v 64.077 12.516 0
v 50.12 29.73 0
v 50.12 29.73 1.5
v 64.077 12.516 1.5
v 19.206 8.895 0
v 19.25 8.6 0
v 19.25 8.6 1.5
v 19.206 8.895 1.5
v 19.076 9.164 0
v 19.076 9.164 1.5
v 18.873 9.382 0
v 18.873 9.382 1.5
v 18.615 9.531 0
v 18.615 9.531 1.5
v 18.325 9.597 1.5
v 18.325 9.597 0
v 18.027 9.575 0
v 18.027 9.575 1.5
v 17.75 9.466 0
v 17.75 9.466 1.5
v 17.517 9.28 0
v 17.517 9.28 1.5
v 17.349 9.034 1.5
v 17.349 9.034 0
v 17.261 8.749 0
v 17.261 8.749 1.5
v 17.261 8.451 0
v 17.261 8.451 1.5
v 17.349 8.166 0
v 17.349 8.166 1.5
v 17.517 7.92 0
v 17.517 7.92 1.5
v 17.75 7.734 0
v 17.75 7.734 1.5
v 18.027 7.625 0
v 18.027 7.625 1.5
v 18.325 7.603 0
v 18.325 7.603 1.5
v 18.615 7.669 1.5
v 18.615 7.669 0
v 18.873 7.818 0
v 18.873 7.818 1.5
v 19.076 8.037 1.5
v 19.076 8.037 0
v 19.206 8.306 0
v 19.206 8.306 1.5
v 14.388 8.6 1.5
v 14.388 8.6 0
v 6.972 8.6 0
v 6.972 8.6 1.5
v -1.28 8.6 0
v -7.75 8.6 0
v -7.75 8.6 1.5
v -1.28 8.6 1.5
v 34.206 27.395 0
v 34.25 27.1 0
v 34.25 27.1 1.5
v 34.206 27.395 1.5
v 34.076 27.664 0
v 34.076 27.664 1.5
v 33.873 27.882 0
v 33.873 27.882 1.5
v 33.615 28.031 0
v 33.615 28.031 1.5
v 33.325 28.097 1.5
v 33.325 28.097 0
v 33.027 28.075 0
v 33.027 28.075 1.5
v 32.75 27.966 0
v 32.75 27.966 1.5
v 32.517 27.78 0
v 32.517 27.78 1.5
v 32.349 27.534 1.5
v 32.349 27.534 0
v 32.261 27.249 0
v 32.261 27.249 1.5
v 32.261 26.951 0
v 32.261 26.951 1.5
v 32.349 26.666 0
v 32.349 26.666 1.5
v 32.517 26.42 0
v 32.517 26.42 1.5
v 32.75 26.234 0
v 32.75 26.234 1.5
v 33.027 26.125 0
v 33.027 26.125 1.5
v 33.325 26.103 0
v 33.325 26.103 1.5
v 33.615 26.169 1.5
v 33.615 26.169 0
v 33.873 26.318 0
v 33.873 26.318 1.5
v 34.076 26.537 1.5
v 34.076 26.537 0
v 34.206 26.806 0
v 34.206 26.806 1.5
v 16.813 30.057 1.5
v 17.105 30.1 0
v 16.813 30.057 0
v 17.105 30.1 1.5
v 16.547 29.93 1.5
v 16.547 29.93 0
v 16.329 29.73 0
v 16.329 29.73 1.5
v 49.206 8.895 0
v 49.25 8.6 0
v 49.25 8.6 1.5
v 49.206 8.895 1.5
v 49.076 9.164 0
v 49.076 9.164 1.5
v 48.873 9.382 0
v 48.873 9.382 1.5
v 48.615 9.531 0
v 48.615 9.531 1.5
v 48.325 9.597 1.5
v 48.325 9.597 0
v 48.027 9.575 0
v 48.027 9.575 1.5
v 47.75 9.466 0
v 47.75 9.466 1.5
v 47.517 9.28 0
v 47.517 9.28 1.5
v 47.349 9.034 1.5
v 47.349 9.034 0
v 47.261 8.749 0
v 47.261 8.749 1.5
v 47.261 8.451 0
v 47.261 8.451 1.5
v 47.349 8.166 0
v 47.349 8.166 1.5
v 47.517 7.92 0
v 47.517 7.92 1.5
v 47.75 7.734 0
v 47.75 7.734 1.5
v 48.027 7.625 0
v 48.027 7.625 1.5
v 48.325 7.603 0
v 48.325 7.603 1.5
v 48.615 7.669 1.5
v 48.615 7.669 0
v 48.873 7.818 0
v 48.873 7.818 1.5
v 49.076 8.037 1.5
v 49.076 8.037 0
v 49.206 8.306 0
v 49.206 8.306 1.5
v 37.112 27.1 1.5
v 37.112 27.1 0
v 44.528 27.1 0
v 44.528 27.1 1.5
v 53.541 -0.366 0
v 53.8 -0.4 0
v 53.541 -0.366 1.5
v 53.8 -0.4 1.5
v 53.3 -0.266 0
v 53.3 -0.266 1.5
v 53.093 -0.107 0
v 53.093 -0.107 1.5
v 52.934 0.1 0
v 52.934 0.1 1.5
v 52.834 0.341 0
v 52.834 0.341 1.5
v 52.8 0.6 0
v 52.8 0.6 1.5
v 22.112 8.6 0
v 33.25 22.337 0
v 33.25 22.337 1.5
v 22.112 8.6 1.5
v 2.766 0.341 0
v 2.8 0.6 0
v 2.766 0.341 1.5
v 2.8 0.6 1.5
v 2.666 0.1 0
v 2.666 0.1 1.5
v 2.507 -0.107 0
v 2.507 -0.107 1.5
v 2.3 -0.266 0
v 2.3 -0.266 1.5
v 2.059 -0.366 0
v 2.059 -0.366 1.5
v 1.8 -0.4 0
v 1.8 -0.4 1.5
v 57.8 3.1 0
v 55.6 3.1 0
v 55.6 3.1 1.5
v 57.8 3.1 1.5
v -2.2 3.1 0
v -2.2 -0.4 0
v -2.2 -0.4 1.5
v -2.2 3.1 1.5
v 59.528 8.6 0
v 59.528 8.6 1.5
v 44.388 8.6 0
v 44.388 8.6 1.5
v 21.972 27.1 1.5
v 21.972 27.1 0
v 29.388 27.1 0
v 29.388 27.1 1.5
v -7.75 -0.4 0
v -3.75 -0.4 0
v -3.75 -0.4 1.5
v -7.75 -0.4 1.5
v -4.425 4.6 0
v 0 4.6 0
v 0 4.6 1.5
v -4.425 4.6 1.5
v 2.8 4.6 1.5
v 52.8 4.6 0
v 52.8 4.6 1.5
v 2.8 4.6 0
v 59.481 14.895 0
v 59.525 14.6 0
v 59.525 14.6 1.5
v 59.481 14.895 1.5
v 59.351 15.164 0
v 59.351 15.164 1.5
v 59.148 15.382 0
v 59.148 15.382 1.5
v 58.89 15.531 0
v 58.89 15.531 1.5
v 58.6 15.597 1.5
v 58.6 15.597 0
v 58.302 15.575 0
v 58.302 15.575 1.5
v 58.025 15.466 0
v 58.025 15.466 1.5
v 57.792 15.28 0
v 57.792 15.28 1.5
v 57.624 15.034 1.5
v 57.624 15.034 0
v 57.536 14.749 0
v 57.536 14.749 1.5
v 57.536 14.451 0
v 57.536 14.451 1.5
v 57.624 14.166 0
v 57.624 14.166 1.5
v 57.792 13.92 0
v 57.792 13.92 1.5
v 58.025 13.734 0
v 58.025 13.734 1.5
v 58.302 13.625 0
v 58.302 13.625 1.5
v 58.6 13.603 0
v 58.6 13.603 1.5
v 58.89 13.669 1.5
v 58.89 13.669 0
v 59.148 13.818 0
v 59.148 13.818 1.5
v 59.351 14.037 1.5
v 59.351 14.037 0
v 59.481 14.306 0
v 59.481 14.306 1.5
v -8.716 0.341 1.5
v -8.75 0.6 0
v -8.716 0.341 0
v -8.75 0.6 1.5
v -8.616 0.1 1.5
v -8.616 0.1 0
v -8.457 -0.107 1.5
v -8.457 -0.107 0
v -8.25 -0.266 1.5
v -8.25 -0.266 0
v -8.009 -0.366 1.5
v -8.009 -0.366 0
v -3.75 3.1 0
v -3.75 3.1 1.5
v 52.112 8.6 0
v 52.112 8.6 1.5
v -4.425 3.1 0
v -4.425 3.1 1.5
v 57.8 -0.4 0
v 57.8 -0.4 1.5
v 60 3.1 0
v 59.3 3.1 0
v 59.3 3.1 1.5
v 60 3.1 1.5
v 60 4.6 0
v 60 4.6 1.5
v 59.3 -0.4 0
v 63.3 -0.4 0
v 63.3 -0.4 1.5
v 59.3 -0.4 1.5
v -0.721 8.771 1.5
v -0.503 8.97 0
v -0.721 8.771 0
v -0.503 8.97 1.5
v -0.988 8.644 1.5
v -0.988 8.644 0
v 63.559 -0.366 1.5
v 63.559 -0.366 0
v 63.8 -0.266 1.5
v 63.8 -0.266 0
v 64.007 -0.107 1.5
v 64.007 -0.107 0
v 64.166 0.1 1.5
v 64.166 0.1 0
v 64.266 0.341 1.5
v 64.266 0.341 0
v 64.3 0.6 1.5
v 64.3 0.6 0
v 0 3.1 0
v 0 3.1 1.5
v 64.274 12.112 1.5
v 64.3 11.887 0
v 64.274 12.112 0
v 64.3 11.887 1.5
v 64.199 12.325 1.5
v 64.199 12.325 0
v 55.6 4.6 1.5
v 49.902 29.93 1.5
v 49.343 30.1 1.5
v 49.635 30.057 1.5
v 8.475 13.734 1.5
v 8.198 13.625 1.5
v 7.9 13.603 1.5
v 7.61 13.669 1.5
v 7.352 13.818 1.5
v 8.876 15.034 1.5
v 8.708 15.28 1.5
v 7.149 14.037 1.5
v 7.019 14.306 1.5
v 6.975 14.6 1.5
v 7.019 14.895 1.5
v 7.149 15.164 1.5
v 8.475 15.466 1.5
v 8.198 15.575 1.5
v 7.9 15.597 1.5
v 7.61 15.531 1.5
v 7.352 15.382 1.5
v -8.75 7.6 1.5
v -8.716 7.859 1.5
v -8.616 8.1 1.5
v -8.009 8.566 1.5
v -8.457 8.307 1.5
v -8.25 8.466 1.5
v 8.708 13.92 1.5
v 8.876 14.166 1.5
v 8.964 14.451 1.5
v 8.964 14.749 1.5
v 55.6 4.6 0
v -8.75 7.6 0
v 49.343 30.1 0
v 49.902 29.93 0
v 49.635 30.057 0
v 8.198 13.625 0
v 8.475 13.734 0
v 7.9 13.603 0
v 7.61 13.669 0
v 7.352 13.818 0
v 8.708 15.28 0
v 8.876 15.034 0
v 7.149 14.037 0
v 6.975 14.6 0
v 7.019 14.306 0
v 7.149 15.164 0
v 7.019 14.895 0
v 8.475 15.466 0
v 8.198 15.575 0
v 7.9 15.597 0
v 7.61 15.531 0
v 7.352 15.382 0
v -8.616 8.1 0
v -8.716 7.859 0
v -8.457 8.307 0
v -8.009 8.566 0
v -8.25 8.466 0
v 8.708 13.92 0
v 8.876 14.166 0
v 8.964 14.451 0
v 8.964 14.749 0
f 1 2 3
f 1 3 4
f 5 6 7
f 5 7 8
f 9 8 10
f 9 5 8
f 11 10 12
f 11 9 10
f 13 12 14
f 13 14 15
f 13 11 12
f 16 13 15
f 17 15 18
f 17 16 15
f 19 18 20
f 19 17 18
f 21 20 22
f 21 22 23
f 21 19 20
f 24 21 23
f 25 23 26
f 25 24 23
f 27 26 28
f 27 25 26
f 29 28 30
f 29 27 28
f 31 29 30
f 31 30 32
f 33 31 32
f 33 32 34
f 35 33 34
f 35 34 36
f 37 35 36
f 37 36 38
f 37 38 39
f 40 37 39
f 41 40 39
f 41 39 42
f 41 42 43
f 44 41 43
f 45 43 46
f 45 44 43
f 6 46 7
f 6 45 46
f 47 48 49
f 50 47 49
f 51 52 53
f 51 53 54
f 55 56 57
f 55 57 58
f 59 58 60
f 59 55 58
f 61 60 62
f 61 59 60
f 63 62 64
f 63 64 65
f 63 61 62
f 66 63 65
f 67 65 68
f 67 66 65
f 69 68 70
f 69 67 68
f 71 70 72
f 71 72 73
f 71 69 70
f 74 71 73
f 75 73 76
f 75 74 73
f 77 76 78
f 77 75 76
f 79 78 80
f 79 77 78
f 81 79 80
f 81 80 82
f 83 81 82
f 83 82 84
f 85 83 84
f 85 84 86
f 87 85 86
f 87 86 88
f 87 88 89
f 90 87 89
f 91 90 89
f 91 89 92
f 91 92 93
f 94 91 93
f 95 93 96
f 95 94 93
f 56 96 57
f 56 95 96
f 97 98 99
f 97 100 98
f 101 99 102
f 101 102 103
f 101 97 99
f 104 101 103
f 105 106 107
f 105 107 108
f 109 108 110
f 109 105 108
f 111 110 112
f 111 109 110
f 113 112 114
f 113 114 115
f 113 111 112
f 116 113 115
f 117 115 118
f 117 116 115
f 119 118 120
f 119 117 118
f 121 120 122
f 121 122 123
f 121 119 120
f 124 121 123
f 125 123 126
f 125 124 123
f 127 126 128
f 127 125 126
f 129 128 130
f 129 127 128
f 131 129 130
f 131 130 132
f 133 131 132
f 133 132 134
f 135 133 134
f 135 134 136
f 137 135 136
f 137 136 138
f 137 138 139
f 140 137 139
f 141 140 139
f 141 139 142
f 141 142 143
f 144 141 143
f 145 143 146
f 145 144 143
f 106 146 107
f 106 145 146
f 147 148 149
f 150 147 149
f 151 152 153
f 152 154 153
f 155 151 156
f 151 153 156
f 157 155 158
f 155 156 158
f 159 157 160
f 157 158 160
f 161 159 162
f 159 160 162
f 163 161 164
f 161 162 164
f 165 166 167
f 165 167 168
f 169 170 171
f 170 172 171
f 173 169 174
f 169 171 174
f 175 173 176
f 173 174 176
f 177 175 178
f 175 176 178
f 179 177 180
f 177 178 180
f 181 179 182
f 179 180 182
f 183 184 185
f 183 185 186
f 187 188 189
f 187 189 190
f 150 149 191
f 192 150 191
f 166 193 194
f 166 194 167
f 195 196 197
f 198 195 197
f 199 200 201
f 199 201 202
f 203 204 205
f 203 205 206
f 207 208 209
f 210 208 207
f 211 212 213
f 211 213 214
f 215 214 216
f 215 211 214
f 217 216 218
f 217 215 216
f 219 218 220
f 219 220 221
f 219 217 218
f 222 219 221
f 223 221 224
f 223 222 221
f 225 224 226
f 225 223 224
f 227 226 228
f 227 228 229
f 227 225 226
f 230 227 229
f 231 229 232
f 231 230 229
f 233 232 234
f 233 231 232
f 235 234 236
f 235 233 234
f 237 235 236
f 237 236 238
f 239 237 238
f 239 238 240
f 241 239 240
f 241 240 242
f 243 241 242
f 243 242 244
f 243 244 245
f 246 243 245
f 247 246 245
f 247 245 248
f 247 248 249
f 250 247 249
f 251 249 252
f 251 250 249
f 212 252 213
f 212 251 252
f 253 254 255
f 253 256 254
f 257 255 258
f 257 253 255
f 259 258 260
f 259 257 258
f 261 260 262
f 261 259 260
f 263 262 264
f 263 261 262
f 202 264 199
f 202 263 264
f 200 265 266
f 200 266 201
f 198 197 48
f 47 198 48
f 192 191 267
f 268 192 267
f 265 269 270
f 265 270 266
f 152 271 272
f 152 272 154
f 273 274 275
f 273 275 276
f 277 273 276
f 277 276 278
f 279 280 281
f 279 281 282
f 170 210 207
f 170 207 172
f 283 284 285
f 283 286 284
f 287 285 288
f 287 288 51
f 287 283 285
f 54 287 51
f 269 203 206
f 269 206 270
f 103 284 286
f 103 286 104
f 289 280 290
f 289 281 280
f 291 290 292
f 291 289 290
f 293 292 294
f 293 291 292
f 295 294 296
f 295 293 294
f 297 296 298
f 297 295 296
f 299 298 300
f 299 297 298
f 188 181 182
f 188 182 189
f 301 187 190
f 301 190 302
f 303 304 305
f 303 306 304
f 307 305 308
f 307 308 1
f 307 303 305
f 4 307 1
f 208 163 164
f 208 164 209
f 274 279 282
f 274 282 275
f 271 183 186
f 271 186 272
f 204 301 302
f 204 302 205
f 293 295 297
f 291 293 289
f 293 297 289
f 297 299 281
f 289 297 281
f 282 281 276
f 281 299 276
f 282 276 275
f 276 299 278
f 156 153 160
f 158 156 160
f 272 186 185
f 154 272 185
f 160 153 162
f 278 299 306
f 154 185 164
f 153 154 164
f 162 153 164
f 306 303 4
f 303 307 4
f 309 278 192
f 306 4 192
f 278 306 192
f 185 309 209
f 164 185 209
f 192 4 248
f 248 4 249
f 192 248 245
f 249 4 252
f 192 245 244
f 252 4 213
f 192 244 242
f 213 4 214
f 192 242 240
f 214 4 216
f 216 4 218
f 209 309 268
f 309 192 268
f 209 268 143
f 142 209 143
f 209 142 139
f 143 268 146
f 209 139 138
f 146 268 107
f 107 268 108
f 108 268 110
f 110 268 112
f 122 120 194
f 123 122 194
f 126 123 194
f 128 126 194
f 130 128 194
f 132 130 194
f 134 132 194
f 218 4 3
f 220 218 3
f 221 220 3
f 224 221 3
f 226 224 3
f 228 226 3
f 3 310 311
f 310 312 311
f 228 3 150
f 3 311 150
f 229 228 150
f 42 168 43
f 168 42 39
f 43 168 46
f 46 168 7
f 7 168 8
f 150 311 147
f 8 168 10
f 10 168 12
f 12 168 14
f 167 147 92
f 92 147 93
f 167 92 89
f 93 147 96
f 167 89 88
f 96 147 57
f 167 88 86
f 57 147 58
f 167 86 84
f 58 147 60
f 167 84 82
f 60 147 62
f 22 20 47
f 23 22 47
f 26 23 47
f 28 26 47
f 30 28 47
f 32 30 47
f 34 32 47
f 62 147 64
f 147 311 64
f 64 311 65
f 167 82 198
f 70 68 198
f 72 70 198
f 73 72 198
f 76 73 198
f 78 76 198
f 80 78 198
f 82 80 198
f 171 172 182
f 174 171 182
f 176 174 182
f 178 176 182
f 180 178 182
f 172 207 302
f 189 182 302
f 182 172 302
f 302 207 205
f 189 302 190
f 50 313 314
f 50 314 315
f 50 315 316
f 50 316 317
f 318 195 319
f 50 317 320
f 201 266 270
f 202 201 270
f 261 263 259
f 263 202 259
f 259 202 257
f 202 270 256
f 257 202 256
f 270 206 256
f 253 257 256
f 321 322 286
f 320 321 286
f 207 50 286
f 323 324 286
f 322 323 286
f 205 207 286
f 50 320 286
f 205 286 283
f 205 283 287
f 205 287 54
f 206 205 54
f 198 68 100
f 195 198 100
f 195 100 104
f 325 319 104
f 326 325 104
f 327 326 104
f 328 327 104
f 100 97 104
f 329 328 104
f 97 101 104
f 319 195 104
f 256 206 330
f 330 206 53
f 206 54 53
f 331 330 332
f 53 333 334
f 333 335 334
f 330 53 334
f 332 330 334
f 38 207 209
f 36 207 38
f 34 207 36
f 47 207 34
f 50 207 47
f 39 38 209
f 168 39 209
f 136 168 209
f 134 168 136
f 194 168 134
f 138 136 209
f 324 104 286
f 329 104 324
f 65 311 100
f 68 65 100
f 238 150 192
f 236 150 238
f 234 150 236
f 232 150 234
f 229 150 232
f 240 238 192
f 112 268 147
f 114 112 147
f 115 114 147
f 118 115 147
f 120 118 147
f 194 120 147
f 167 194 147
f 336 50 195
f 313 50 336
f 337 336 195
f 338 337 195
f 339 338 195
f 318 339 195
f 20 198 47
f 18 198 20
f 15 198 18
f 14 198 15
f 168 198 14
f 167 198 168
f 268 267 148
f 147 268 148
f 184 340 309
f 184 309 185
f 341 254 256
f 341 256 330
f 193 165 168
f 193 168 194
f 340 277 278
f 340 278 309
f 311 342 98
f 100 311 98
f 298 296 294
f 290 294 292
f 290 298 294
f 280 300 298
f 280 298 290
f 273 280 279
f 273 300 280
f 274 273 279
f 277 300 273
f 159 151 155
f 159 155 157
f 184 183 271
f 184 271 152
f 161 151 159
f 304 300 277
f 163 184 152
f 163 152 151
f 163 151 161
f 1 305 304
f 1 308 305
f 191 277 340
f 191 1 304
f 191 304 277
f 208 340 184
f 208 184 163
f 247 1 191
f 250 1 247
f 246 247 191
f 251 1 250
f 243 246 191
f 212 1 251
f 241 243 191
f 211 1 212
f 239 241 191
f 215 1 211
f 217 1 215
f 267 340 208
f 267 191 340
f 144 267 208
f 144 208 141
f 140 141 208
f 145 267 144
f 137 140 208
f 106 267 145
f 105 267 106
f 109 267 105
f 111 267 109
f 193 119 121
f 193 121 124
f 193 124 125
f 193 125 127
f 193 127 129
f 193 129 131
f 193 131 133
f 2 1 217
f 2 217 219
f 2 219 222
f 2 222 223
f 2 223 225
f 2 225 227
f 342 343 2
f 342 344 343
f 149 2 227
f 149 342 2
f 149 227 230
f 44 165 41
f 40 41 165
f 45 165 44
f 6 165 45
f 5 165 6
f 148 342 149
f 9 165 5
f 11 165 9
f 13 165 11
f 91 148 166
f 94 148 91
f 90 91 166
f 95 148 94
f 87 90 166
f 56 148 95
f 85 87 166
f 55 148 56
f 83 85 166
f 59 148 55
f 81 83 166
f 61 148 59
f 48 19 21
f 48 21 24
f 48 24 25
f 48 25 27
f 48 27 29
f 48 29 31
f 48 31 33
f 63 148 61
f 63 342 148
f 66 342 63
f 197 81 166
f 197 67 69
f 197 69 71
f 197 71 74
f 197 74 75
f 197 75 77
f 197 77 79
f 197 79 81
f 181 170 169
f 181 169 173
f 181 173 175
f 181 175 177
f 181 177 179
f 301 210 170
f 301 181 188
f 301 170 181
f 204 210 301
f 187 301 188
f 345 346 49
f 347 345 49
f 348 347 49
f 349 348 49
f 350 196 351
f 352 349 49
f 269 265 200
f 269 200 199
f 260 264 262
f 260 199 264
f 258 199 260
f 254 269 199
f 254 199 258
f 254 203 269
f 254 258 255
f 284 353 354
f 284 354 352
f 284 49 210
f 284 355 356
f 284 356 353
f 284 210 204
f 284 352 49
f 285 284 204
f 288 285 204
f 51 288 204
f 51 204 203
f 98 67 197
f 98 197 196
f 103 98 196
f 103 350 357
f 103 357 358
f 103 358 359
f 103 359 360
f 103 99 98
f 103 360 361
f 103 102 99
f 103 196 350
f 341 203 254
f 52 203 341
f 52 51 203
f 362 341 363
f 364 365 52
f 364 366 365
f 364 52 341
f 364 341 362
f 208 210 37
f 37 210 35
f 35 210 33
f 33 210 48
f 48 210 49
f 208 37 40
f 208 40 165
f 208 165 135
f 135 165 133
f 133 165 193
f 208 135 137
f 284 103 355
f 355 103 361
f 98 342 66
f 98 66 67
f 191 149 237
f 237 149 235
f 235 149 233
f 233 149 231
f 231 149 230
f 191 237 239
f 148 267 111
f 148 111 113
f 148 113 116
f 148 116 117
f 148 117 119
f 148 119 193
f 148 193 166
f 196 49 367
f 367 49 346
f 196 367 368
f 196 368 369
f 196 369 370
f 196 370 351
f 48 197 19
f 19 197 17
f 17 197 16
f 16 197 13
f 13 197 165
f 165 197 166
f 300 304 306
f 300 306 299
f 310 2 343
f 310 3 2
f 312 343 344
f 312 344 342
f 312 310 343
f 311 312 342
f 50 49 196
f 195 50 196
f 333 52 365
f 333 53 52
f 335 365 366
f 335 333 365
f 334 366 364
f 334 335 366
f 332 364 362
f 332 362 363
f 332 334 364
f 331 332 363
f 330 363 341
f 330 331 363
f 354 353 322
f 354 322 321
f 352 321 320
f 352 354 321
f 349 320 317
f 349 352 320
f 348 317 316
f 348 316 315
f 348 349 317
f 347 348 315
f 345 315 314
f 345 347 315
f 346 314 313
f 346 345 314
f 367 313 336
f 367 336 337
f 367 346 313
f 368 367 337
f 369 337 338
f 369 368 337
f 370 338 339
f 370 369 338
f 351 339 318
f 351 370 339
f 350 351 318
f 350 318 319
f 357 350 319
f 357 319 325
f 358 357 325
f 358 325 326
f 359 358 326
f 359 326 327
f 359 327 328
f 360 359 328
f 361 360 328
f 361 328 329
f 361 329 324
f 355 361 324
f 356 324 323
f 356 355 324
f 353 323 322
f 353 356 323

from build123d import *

# Parameters (mm, degrees)
SKETCH_1_R      = 1
EXTRUDE_1_DEPTH = 1.5
FILLET_1_R      = 1


with BuildPart() as part:
    # 草图1 → 凸台-拉伸1 (new body)
    with BuildSketch(Plane.XY):
        Polygon((64.3, -0.39974336), (59.3, -0.39974336), (59.3, 3.10025664), (60, 3.10025664), (60, 4.60025664), (55.6, 4.60025664), (55.6, 3.10025664), (57.8, 3.10025664), (57.8, -0.39974336), (52.8, -0.39974336), (52.8, 4.60025664), (2.8, 4.60025664), (2.8, -0.39974336), (-2.2, -0.39974336), (-2.2, 3.10025664), (0, 3.10025664), (0, 4.60025664), (-4.42519, 4.60025664), (-4.42519, 3.10025664), (-3.75, 3.10025664), (-3.75, -0.39974336), (-8.75, -0.39974336), (-8.75, 8.60025664), (-0.803608582, 8.60025664), (16.62882385, 30.10025664), (34.845120873, 30.10025664), (49.819650388, 30.10025664), (64.3, 12.241158786), align=None)
        with Locations((33.25, 27.10025664)):
            Circle(SKETCH_1_R, mode=Mode.SUBTRACT)
        with Locations((48.25, 8.60025664)):
            Circle(SKETCH_1_R, mode=Mode.SUBTRACT)
        with Locations((18.25, 8.60025664)):
            Circle(SKETCH_1_R, mode=Mode.SUBTRACT)
        with Locations((58.525, 14.60025664)):
            Circle(SKETCH_1_R, mode=Mode.SUBTRACT)
        with Locations(Location((7.975, 14.60025664, 0), (0, 0, 180))):
            Circle(SKETCH_1_R, mode=Mode.SUBTRACT)
        Polygon((59.527646909, 8.60025664), (52.112217956, 8.60025664), (37.112217956, 27.10025664), (44.527646909, 27.10025664), align=None, mode=Mode.SUBTRACT)
        Polygon((44.387782044, 8.60025664), (33.25, 22.336854495), (22.112217956, 8.60025664), align=None, mode=Mode.SUBTRACT)
        Polygon((21.972353091, 27.10025664), (29.387782044, 27.10025664), (14.387782044, 8.60025664), (6.972353091, 8.60025664), align=None, mode=Mode.SUBTRACT)
    extrude(amount=EXTRUDE_1_DEPTH)

    # 圆角1
    fillet_1_edges = [part.edges().sort_by_distance(p)[0] for p in [
        (64.3, -0.39974336, 0.75),
        (52.8, -0.39974336, 0.75),
        (2.8, -0.39974336, 0.75),
        (-8.75, -0.39974336, 0.75),
        (-8.75, 8.60025664, 0.75),
        (-0.803608582, 8.60025664, 0.75),
        (16.62882385, 30.10025664, 0.75),
        (49.819650388, 30.10025664, 0.75),
        (64.3, 12.241158786, 0.75),
    ]]
    fillet(fillet_1_edges, radius=FILLET_1_R)


solid = part.part
